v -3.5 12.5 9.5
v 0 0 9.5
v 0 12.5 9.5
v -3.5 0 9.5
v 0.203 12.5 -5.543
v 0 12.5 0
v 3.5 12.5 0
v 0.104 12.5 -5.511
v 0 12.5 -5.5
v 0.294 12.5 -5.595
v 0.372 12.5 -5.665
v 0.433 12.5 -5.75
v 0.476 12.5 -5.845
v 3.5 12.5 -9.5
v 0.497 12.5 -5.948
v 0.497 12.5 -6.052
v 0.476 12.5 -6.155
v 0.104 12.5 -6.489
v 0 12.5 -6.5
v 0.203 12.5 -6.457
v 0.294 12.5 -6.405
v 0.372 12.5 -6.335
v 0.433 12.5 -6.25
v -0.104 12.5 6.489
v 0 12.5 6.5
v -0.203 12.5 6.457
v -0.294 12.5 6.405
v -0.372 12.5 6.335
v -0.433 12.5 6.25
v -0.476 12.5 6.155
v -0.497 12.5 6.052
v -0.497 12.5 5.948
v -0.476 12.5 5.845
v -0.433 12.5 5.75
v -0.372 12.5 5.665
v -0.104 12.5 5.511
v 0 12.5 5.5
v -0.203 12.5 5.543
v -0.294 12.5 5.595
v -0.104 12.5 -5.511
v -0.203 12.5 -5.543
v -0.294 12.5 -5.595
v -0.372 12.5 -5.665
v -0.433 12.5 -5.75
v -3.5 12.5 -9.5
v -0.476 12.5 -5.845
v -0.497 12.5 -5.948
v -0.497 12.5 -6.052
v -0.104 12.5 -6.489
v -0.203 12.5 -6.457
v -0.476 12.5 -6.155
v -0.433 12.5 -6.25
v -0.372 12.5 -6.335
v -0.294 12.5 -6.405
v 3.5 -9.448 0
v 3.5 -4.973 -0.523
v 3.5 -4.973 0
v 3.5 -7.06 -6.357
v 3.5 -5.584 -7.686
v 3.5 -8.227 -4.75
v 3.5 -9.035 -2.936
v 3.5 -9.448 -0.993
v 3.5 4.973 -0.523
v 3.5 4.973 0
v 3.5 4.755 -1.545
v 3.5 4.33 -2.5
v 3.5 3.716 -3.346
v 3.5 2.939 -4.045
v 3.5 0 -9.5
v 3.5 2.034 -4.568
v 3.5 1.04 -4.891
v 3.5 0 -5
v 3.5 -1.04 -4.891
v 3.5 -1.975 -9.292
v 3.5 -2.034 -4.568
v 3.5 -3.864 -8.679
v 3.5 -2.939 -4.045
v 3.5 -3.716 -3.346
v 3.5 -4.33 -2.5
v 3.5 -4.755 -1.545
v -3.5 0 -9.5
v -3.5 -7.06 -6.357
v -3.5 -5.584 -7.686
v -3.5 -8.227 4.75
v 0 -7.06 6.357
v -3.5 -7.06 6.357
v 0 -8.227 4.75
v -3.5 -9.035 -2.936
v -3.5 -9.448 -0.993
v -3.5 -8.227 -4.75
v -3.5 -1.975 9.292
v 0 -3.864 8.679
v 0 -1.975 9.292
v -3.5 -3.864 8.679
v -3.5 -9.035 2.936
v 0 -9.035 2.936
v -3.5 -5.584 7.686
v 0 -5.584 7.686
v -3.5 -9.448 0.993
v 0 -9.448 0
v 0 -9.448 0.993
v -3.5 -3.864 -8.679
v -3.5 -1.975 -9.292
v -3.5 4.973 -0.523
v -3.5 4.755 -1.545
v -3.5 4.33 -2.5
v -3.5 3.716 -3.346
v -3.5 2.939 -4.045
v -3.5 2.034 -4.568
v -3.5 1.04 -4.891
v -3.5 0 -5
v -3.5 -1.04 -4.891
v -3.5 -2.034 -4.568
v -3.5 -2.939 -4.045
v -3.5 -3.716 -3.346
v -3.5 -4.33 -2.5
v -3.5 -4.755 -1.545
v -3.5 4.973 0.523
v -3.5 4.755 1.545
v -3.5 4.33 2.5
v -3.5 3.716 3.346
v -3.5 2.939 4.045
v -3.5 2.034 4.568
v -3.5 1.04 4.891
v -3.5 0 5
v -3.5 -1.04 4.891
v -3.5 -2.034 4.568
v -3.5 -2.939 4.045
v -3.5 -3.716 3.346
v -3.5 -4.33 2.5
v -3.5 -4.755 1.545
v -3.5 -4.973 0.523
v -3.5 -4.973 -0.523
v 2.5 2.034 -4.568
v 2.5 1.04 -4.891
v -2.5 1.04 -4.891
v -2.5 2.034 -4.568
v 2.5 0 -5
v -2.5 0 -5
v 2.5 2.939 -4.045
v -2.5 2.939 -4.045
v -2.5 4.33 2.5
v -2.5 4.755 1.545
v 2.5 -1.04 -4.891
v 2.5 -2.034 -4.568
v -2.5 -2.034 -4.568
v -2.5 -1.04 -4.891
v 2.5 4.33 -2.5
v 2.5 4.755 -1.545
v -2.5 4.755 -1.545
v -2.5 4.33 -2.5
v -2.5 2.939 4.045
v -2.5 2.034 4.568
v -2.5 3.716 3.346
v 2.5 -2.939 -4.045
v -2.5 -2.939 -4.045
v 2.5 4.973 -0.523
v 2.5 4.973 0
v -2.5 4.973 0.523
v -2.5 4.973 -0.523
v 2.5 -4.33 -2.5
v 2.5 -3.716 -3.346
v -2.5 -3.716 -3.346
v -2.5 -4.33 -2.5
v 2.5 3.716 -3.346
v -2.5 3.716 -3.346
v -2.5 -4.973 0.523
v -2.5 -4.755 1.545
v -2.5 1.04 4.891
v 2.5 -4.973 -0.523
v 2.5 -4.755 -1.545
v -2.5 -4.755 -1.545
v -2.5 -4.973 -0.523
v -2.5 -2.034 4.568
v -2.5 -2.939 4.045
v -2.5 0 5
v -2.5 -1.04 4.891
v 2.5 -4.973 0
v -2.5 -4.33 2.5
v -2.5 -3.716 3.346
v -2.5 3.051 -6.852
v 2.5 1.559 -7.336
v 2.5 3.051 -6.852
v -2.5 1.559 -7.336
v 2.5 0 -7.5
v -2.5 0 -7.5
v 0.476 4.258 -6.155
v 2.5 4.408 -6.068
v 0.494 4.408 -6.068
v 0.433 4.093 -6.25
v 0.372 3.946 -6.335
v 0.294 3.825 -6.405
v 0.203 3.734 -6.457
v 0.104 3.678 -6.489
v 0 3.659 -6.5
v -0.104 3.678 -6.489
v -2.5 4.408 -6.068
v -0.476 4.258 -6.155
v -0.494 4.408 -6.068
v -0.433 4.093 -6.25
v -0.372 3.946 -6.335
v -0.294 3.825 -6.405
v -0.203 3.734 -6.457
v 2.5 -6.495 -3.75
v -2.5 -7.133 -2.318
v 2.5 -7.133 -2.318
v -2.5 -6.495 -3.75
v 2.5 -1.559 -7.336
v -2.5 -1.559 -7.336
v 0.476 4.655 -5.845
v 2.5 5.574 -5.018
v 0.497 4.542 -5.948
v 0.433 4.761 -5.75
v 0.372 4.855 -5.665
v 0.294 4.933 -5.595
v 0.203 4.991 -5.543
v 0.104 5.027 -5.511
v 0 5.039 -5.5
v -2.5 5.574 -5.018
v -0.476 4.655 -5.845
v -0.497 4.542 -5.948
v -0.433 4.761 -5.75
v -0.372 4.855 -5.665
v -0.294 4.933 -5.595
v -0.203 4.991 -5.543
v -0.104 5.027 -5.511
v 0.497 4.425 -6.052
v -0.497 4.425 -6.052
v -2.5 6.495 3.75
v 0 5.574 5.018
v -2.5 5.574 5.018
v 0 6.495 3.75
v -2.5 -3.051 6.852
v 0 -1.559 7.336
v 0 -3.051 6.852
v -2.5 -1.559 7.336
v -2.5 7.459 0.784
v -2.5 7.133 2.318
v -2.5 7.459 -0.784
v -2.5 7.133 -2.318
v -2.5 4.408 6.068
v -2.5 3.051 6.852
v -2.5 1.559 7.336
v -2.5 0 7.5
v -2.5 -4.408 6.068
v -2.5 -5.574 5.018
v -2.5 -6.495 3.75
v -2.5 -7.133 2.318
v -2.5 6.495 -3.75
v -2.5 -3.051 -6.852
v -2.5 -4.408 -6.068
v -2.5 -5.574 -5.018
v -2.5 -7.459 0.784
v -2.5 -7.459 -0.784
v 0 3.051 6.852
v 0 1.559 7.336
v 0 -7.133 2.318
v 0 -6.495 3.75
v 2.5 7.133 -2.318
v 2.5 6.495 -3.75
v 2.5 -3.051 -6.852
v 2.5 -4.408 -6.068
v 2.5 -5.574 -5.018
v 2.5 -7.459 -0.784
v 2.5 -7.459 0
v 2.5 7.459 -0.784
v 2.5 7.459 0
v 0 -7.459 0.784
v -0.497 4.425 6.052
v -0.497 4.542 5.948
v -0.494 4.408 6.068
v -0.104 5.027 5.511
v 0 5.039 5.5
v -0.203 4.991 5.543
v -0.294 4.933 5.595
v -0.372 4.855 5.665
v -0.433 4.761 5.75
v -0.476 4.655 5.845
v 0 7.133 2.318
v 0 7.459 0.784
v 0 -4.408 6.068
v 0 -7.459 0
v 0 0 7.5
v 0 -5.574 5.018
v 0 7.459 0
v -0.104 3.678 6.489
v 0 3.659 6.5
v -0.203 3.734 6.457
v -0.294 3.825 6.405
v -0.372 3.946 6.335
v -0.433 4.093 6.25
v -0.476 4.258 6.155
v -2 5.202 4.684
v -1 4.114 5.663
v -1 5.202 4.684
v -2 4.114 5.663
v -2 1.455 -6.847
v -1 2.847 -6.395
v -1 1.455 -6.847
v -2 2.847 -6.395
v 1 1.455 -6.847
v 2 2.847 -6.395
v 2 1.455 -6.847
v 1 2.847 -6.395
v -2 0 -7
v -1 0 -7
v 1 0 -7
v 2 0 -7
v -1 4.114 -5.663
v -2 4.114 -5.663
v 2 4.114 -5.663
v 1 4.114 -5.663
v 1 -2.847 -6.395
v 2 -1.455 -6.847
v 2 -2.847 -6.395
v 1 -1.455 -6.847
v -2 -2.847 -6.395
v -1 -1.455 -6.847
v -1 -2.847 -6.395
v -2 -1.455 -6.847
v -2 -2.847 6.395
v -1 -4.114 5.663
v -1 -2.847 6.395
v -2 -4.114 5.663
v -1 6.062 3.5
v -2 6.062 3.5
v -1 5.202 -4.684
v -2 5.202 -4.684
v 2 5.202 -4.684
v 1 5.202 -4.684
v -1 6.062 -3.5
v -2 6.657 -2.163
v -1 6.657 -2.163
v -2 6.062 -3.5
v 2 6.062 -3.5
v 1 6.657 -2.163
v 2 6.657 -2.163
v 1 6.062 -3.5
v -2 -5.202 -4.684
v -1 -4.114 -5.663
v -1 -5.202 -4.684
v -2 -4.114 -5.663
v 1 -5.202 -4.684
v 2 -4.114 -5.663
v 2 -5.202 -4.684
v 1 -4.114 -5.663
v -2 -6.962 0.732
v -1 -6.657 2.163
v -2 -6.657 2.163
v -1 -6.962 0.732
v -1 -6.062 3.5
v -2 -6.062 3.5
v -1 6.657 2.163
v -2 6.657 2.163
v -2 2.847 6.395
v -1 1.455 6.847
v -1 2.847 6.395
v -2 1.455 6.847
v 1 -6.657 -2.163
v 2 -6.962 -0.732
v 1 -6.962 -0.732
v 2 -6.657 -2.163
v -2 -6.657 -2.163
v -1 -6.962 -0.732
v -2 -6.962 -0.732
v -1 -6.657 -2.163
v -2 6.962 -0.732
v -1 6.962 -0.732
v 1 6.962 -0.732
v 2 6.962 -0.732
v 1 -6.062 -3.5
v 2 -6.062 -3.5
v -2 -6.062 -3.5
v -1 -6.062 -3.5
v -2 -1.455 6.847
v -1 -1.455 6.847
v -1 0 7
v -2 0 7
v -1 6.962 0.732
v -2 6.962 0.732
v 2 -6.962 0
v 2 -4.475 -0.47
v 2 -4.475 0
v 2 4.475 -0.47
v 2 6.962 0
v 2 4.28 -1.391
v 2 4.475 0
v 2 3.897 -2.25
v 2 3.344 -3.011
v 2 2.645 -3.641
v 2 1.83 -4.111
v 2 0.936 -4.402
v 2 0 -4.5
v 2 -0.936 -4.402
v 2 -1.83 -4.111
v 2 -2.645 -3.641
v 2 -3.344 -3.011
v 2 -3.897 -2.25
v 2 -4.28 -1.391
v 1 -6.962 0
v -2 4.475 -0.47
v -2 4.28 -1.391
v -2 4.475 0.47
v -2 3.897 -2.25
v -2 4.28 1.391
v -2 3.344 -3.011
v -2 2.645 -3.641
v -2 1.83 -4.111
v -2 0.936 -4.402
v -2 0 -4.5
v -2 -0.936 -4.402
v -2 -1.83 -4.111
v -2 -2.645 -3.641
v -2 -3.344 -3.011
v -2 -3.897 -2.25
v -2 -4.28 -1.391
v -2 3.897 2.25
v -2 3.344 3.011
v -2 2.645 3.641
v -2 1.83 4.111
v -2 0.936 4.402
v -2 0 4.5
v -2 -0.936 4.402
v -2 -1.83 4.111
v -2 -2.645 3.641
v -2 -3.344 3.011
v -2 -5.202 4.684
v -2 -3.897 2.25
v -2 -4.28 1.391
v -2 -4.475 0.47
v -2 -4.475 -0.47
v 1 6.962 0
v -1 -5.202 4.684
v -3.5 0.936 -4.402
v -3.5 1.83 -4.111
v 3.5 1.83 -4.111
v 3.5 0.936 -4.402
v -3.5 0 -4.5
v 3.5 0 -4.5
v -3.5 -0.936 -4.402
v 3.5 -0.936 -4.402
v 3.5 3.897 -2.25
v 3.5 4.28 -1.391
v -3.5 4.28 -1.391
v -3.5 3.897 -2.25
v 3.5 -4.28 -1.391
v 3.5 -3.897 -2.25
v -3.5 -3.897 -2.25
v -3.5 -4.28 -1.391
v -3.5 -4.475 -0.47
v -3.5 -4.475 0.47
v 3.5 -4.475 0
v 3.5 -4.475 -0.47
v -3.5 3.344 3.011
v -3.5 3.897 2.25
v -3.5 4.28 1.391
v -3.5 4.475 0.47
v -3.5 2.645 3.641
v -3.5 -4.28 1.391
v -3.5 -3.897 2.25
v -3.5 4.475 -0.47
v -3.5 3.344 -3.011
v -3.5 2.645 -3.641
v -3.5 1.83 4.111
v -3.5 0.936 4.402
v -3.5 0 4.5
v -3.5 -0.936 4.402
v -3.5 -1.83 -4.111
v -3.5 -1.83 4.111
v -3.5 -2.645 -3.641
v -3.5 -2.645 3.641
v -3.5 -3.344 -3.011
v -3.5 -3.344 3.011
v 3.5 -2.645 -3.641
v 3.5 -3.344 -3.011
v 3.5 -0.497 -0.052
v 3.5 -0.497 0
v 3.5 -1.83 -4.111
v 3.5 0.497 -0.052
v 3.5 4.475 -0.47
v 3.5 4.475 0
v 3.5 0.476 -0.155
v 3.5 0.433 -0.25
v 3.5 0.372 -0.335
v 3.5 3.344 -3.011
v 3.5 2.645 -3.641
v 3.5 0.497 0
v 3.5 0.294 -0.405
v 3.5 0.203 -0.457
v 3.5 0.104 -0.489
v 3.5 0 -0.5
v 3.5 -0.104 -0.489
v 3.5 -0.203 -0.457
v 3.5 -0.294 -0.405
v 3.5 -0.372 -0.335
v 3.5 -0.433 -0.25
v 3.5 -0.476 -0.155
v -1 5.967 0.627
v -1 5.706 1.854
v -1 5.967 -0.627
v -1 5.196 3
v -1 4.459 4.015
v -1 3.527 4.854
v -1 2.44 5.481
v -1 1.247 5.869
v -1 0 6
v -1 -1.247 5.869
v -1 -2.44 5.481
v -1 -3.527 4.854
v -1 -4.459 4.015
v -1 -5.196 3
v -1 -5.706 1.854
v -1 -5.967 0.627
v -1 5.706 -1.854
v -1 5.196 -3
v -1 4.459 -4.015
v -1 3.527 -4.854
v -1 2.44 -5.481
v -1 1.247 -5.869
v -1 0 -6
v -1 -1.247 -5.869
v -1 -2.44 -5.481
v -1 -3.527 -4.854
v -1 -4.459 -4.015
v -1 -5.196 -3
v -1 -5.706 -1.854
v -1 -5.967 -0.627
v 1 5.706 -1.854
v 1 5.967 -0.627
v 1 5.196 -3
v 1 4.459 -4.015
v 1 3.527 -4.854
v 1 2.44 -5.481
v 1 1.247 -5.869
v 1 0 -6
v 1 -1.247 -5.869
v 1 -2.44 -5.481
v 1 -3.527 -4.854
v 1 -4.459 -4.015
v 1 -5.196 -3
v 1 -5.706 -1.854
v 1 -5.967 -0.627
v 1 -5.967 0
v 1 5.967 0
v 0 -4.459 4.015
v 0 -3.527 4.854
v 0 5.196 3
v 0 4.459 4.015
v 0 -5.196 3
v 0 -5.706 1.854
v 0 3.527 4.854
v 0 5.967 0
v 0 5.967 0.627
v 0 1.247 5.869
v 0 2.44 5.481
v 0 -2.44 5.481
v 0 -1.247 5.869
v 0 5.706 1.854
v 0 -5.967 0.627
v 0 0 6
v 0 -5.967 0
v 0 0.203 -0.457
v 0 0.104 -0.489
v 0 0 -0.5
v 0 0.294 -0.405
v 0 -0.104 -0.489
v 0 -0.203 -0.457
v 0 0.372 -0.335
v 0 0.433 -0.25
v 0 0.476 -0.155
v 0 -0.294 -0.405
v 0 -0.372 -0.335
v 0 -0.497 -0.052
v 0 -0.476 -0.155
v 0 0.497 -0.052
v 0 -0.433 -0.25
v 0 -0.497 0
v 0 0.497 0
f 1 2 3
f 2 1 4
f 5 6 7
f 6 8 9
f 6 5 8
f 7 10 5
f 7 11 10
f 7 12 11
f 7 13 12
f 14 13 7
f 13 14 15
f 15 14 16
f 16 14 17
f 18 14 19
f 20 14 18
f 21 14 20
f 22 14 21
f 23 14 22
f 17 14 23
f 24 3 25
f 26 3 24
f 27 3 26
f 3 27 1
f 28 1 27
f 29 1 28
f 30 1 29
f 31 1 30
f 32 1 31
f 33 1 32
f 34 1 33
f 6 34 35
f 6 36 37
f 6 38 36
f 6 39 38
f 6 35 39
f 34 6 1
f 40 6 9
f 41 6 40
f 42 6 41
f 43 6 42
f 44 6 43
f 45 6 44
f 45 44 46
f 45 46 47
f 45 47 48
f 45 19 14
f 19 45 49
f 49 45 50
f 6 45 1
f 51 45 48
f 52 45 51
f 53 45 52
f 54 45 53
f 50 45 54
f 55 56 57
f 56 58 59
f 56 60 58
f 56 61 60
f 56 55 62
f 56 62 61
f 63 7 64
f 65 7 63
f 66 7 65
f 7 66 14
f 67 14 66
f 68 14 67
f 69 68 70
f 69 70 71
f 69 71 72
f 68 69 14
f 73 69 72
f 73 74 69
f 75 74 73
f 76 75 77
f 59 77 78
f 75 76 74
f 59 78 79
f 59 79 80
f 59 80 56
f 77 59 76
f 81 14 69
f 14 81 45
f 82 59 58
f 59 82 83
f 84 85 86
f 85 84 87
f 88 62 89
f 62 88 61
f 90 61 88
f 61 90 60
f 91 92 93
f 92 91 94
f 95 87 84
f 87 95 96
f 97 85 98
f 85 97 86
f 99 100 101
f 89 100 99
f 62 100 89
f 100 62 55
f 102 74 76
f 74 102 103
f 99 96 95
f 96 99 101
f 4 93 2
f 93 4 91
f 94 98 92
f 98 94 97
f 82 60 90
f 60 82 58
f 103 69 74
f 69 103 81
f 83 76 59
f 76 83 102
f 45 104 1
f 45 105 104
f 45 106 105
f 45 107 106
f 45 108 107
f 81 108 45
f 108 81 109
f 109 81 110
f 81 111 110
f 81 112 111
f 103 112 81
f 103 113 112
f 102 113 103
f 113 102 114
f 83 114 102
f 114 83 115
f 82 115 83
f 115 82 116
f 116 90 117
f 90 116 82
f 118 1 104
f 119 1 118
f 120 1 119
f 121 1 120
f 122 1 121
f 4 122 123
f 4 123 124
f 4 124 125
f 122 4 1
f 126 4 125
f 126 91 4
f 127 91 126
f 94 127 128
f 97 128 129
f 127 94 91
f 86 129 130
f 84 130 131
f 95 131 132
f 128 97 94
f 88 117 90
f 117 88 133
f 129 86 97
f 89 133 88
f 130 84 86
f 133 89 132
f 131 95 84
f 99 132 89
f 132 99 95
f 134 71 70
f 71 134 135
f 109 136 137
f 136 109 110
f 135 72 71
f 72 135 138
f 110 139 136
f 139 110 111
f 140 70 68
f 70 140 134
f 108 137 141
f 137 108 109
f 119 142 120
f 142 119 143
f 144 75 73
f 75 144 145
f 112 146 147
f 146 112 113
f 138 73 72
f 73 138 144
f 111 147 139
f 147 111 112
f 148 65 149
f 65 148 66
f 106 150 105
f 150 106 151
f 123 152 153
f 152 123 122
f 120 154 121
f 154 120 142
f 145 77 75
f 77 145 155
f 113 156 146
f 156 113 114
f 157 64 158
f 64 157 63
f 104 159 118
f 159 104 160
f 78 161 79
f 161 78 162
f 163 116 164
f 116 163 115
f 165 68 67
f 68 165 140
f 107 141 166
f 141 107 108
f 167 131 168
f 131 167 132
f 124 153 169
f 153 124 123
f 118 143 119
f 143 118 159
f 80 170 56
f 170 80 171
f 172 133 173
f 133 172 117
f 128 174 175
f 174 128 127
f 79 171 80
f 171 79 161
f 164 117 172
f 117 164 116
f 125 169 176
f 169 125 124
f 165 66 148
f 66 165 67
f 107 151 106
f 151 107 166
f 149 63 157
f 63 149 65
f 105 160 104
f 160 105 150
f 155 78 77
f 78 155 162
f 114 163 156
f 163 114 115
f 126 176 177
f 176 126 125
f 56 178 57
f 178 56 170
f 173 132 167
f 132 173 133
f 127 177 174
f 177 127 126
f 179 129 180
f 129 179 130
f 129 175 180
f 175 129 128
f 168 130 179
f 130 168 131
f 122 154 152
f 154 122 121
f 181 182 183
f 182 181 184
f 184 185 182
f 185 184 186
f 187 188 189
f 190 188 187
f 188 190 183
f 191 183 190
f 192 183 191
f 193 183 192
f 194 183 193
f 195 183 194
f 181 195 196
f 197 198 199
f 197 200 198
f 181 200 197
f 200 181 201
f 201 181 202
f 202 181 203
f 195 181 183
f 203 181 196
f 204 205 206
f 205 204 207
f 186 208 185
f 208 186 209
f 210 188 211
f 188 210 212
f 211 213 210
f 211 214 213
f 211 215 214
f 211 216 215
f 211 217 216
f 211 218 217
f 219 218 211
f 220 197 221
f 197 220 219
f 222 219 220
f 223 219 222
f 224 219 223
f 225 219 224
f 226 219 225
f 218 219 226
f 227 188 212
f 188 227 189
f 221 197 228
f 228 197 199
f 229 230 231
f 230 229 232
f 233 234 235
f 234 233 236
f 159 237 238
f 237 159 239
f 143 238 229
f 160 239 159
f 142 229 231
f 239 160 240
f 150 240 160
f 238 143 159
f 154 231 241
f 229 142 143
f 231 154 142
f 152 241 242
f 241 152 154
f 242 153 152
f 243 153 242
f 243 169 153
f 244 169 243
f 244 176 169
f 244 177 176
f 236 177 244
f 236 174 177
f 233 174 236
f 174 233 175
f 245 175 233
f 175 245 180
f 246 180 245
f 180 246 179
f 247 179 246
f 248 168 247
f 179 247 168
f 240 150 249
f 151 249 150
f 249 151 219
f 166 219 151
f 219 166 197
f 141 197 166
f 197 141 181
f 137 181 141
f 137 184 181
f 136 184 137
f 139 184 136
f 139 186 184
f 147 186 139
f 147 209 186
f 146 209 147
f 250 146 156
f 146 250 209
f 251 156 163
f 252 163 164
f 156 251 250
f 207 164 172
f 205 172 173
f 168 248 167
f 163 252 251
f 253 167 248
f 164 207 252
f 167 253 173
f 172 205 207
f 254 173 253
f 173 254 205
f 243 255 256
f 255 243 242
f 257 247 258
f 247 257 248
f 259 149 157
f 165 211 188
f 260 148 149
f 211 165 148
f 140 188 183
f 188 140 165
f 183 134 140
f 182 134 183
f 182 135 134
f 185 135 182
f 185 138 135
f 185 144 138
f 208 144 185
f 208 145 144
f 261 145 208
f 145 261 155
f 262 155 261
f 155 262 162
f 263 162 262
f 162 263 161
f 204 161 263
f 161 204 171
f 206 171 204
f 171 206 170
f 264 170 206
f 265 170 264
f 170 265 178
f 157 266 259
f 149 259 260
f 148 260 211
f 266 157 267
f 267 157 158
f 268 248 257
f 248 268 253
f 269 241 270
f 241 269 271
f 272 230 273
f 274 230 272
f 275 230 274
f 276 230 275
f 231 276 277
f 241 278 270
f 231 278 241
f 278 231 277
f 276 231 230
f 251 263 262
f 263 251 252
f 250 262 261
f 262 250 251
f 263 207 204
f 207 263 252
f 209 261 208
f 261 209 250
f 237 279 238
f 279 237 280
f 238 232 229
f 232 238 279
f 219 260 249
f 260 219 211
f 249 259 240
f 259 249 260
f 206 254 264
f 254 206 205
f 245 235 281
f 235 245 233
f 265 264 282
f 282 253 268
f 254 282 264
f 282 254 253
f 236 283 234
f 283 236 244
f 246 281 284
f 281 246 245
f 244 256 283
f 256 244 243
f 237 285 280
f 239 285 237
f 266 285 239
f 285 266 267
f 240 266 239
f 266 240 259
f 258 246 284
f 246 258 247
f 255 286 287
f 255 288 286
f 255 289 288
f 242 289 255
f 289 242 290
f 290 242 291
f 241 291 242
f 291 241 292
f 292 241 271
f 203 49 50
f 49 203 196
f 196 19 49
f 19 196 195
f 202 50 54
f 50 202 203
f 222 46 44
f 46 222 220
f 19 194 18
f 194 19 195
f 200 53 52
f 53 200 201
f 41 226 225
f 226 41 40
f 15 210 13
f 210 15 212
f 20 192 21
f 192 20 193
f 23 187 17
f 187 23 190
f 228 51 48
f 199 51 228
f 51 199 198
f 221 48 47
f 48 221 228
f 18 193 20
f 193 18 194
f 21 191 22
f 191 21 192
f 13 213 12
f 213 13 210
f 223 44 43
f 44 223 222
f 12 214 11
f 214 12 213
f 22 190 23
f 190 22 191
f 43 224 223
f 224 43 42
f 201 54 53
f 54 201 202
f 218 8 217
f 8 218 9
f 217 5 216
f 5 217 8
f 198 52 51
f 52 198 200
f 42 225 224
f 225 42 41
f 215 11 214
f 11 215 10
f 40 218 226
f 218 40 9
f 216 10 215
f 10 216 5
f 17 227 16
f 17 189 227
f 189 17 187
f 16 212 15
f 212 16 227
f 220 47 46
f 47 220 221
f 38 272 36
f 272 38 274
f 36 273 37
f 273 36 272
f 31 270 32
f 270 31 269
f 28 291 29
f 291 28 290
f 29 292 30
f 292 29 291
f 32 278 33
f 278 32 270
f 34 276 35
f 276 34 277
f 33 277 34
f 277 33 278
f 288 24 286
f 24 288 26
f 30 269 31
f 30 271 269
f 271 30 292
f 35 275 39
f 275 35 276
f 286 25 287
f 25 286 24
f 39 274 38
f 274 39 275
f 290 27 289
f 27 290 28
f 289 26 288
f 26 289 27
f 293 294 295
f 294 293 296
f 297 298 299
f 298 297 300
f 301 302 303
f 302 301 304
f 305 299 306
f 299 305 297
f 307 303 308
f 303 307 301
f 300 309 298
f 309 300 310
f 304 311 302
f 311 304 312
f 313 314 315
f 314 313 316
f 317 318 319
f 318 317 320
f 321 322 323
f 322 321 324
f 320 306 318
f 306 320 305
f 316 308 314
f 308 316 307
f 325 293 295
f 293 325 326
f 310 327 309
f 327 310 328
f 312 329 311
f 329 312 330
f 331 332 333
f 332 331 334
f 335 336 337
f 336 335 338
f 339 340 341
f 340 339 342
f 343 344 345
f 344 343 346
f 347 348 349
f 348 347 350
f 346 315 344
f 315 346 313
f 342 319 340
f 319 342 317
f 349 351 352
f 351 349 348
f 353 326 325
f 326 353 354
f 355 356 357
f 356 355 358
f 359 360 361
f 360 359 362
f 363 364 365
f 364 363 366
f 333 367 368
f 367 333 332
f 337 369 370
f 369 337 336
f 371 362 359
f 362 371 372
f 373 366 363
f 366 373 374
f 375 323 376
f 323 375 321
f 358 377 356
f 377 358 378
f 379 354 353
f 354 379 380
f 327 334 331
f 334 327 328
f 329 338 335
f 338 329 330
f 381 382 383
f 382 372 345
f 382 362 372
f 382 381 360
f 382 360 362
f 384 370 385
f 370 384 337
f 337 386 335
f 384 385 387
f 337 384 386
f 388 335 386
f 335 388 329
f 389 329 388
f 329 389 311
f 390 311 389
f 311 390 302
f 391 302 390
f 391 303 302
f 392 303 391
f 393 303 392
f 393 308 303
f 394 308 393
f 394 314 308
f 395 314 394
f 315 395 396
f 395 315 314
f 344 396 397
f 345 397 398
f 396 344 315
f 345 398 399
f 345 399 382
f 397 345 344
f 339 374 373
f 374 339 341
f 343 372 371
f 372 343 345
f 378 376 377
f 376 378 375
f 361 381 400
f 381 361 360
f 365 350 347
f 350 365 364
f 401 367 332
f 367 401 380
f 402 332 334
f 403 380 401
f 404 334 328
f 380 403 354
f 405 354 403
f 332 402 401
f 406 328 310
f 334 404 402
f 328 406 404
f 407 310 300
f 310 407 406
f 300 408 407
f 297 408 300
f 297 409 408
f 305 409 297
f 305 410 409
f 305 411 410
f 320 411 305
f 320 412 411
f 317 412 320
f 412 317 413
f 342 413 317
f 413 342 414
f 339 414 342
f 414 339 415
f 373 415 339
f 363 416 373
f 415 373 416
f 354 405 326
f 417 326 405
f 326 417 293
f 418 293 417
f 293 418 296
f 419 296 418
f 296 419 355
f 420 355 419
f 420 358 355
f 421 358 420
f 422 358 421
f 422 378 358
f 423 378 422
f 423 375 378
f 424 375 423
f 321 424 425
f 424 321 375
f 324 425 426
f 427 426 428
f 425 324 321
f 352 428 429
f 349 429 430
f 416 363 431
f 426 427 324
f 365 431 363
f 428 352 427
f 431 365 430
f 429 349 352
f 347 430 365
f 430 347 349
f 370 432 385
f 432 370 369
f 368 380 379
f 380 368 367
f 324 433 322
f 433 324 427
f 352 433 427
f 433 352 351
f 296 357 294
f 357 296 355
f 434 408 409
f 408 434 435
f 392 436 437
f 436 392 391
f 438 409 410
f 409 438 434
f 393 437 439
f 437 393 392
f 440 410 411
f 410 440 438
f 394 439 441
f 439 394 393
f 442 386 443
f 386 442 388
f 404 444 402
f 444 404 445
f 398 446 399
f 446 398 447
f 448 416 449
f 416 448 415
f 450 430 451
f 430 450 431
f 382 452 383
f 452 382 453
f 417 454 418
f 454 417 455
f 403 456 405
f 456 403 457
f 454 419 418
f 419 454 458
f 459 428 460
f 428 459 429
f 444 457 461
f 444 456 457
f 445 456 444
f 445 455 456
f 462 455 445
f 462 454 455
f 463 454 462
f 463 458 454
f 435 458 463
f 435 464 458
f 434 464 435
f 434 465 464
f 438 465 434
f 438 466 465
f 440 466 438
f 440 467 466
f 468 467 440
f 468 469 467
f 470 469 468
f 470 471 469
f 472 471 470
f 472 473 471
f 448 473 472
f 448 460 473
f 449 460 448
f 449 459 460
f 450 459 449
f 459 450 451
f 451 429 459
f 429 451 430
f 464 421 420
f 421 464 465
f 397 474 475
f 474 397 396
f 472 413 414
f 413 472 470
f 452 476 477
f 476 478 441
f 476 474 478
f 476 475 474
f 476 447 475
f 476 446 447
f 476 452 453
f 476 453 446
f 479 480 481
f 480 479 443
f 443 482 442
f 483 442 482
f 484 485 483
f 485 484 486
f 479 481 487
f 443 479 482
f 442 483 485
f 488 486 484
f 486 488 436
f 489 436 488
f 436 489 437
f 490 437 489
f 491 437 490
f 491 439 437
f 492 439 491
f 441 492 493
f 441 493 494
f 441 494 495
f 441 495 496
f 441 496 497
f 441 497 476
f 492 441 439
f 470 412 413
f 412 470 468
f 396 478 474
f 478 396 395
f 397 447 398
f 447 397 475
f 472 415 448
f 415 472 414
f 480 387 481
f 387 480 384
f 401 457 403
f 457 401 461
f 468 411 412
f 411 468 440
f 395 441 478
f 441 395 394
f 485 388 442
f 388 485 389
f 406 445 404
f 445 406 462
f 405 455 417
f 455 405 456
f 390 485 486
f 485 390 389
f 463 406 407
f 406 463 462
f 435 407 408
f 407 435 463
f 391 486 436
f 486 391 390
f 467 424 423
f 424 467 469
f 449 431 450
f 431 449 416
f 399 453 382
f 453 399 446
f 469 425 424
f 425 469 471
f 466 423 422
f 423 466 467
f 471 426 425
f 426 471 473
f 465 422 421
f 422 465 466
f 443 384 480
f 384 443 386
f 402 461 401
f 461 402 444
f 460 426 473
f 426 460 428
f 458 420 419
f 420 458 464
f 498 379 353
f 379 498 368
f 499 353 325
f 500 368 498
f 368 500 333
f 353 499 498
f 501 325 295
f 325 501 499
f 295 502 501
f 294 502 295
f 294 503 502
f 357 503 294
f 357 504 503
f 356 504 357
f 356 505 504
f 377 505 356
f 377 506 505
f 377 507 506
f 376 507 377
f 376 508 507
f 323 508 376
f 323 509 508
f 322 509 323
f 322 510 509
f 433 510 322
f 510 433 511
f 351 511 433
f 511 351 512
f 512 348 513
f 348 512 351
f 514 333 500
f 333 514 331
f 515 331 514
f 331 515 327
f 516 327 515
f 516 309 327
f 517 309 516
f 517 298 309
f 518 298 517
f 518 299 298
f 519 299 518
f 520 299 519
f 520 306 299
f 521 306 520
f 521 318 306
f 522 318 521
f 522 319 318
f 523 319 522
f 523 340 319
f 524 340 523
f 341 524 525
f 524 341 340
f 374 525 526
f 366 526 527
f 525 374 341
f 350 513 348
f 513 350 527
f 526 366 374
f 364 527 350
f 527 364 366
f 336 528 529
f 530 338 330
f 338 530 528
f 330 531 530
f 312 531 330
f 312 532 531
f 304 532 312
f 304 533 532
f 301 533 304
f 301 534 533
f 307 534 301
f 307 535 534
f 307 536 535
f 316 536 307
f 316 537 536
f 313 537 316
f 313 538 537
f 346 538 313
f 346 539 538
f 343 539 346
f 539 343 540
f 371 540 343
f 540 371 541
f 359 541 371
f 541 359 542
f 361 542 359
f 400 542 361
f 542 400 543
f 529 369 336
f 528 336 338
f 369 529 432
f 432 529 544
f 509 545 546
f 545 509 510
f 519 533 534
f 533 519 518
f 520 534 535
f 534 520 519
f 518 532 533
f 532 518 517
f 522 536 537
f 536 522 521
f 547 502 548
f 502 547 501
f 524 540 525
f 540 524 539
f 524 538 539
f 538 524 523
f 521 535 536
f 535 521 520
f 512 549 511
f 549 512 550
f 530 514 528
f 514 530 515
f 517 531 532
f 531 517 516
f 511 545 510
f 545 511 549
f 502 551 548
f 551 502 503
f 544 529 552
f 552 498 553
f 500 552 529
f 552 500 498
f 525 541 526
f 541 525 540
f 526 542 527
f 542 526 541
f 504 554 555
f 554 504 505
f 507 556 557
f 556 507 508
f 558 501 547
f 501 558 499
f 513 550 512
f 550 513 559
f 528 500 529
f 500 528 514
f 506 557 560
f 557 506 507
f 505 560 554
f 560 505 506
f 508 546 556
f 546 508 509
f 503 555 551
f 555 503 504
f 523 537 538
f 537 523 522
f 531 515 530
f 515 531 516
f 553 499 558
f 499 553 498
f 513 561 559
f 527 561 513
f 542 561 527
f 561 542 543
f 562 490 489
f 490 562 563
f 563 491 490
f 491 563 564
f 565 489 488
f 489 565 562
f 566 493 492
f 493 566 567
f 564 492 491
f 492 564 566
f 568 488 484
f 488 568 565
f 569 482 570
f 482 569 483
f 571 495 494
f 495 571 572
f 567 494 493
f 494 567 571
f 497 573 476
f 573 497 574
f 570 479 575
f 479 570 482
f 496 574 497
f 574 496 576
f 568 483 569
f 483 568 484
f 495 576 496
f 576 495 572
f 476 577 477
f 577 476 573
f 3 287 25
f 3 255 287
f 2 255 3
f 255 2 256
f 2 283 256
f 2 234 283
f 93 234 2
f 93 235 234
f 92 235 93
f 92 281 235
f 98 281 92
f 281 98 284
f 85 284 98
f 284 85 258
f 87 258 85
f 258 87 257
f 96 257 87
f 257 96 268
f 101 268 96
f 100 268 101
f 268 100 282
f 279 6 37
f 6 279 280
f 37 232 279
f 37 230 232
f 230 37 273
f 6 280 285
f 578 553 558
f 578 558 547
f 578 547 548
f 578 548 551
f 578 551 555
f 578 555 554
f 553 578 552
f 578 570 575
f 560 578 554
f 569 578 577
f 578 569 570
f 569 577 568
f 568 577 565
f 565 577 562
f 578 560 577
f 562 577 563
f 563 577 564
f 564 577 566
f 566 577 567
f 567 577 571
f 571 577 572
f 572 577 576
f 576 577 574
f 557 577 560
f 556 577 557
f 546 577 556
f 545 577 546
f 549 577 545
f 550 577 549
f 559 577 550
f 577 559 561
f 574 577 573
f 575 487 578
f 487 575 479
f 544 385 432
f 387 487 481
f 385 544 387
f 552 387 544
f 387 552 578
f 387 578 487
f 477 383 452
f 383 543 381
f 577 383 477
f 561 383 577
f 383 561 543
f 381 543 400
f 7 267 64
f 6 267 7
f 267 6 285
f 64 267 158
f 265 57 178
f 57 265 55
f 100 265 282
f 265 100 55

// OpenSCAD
$fn=30;
wheel_width = 7;

module body(){
    translate([0,0,0]) rotate([0,90,0]){
        difference(){
            hull(){
                cylinder(r=wheel_width+2.5,h=7,center=true);
                translate([0,10,0]) cube([(wheel_width+2.5)*2,5,7],center=true);
            }
            cylinder(r=5,h=9,center=true);
            cylinder(r=wheel_width+0.5,h=5,center=true);
            translate([ (wheel_width-1),0,0]) rotate([-90,0,0]) cylinder(r=0.5,h=100);
            translate([-(wheel_width-1),0,0]) rotate([-90,0,0]) cylinder(r=0.5,h=100);
            
        }
    }    
}
module roue(){
    rotate([0,90,0]){
        difference(){
            union(){
                cylinder(r=wheel_width,h=4,center=true);
                cylinder(r=4.5,h=7,center=true);
            }
            difference(){
                cylinder(r=wheel_width+1,h=2,center=true);
                cylinder(r=wheel_width-1,h=3,center=true);
            }
            cylinder(r=0.5,h=20);
        }
    }
}


difference(){
    union(){
    body();
    roue();
    }
    translate([0,-100,0])cube([200,200,200]);
}
